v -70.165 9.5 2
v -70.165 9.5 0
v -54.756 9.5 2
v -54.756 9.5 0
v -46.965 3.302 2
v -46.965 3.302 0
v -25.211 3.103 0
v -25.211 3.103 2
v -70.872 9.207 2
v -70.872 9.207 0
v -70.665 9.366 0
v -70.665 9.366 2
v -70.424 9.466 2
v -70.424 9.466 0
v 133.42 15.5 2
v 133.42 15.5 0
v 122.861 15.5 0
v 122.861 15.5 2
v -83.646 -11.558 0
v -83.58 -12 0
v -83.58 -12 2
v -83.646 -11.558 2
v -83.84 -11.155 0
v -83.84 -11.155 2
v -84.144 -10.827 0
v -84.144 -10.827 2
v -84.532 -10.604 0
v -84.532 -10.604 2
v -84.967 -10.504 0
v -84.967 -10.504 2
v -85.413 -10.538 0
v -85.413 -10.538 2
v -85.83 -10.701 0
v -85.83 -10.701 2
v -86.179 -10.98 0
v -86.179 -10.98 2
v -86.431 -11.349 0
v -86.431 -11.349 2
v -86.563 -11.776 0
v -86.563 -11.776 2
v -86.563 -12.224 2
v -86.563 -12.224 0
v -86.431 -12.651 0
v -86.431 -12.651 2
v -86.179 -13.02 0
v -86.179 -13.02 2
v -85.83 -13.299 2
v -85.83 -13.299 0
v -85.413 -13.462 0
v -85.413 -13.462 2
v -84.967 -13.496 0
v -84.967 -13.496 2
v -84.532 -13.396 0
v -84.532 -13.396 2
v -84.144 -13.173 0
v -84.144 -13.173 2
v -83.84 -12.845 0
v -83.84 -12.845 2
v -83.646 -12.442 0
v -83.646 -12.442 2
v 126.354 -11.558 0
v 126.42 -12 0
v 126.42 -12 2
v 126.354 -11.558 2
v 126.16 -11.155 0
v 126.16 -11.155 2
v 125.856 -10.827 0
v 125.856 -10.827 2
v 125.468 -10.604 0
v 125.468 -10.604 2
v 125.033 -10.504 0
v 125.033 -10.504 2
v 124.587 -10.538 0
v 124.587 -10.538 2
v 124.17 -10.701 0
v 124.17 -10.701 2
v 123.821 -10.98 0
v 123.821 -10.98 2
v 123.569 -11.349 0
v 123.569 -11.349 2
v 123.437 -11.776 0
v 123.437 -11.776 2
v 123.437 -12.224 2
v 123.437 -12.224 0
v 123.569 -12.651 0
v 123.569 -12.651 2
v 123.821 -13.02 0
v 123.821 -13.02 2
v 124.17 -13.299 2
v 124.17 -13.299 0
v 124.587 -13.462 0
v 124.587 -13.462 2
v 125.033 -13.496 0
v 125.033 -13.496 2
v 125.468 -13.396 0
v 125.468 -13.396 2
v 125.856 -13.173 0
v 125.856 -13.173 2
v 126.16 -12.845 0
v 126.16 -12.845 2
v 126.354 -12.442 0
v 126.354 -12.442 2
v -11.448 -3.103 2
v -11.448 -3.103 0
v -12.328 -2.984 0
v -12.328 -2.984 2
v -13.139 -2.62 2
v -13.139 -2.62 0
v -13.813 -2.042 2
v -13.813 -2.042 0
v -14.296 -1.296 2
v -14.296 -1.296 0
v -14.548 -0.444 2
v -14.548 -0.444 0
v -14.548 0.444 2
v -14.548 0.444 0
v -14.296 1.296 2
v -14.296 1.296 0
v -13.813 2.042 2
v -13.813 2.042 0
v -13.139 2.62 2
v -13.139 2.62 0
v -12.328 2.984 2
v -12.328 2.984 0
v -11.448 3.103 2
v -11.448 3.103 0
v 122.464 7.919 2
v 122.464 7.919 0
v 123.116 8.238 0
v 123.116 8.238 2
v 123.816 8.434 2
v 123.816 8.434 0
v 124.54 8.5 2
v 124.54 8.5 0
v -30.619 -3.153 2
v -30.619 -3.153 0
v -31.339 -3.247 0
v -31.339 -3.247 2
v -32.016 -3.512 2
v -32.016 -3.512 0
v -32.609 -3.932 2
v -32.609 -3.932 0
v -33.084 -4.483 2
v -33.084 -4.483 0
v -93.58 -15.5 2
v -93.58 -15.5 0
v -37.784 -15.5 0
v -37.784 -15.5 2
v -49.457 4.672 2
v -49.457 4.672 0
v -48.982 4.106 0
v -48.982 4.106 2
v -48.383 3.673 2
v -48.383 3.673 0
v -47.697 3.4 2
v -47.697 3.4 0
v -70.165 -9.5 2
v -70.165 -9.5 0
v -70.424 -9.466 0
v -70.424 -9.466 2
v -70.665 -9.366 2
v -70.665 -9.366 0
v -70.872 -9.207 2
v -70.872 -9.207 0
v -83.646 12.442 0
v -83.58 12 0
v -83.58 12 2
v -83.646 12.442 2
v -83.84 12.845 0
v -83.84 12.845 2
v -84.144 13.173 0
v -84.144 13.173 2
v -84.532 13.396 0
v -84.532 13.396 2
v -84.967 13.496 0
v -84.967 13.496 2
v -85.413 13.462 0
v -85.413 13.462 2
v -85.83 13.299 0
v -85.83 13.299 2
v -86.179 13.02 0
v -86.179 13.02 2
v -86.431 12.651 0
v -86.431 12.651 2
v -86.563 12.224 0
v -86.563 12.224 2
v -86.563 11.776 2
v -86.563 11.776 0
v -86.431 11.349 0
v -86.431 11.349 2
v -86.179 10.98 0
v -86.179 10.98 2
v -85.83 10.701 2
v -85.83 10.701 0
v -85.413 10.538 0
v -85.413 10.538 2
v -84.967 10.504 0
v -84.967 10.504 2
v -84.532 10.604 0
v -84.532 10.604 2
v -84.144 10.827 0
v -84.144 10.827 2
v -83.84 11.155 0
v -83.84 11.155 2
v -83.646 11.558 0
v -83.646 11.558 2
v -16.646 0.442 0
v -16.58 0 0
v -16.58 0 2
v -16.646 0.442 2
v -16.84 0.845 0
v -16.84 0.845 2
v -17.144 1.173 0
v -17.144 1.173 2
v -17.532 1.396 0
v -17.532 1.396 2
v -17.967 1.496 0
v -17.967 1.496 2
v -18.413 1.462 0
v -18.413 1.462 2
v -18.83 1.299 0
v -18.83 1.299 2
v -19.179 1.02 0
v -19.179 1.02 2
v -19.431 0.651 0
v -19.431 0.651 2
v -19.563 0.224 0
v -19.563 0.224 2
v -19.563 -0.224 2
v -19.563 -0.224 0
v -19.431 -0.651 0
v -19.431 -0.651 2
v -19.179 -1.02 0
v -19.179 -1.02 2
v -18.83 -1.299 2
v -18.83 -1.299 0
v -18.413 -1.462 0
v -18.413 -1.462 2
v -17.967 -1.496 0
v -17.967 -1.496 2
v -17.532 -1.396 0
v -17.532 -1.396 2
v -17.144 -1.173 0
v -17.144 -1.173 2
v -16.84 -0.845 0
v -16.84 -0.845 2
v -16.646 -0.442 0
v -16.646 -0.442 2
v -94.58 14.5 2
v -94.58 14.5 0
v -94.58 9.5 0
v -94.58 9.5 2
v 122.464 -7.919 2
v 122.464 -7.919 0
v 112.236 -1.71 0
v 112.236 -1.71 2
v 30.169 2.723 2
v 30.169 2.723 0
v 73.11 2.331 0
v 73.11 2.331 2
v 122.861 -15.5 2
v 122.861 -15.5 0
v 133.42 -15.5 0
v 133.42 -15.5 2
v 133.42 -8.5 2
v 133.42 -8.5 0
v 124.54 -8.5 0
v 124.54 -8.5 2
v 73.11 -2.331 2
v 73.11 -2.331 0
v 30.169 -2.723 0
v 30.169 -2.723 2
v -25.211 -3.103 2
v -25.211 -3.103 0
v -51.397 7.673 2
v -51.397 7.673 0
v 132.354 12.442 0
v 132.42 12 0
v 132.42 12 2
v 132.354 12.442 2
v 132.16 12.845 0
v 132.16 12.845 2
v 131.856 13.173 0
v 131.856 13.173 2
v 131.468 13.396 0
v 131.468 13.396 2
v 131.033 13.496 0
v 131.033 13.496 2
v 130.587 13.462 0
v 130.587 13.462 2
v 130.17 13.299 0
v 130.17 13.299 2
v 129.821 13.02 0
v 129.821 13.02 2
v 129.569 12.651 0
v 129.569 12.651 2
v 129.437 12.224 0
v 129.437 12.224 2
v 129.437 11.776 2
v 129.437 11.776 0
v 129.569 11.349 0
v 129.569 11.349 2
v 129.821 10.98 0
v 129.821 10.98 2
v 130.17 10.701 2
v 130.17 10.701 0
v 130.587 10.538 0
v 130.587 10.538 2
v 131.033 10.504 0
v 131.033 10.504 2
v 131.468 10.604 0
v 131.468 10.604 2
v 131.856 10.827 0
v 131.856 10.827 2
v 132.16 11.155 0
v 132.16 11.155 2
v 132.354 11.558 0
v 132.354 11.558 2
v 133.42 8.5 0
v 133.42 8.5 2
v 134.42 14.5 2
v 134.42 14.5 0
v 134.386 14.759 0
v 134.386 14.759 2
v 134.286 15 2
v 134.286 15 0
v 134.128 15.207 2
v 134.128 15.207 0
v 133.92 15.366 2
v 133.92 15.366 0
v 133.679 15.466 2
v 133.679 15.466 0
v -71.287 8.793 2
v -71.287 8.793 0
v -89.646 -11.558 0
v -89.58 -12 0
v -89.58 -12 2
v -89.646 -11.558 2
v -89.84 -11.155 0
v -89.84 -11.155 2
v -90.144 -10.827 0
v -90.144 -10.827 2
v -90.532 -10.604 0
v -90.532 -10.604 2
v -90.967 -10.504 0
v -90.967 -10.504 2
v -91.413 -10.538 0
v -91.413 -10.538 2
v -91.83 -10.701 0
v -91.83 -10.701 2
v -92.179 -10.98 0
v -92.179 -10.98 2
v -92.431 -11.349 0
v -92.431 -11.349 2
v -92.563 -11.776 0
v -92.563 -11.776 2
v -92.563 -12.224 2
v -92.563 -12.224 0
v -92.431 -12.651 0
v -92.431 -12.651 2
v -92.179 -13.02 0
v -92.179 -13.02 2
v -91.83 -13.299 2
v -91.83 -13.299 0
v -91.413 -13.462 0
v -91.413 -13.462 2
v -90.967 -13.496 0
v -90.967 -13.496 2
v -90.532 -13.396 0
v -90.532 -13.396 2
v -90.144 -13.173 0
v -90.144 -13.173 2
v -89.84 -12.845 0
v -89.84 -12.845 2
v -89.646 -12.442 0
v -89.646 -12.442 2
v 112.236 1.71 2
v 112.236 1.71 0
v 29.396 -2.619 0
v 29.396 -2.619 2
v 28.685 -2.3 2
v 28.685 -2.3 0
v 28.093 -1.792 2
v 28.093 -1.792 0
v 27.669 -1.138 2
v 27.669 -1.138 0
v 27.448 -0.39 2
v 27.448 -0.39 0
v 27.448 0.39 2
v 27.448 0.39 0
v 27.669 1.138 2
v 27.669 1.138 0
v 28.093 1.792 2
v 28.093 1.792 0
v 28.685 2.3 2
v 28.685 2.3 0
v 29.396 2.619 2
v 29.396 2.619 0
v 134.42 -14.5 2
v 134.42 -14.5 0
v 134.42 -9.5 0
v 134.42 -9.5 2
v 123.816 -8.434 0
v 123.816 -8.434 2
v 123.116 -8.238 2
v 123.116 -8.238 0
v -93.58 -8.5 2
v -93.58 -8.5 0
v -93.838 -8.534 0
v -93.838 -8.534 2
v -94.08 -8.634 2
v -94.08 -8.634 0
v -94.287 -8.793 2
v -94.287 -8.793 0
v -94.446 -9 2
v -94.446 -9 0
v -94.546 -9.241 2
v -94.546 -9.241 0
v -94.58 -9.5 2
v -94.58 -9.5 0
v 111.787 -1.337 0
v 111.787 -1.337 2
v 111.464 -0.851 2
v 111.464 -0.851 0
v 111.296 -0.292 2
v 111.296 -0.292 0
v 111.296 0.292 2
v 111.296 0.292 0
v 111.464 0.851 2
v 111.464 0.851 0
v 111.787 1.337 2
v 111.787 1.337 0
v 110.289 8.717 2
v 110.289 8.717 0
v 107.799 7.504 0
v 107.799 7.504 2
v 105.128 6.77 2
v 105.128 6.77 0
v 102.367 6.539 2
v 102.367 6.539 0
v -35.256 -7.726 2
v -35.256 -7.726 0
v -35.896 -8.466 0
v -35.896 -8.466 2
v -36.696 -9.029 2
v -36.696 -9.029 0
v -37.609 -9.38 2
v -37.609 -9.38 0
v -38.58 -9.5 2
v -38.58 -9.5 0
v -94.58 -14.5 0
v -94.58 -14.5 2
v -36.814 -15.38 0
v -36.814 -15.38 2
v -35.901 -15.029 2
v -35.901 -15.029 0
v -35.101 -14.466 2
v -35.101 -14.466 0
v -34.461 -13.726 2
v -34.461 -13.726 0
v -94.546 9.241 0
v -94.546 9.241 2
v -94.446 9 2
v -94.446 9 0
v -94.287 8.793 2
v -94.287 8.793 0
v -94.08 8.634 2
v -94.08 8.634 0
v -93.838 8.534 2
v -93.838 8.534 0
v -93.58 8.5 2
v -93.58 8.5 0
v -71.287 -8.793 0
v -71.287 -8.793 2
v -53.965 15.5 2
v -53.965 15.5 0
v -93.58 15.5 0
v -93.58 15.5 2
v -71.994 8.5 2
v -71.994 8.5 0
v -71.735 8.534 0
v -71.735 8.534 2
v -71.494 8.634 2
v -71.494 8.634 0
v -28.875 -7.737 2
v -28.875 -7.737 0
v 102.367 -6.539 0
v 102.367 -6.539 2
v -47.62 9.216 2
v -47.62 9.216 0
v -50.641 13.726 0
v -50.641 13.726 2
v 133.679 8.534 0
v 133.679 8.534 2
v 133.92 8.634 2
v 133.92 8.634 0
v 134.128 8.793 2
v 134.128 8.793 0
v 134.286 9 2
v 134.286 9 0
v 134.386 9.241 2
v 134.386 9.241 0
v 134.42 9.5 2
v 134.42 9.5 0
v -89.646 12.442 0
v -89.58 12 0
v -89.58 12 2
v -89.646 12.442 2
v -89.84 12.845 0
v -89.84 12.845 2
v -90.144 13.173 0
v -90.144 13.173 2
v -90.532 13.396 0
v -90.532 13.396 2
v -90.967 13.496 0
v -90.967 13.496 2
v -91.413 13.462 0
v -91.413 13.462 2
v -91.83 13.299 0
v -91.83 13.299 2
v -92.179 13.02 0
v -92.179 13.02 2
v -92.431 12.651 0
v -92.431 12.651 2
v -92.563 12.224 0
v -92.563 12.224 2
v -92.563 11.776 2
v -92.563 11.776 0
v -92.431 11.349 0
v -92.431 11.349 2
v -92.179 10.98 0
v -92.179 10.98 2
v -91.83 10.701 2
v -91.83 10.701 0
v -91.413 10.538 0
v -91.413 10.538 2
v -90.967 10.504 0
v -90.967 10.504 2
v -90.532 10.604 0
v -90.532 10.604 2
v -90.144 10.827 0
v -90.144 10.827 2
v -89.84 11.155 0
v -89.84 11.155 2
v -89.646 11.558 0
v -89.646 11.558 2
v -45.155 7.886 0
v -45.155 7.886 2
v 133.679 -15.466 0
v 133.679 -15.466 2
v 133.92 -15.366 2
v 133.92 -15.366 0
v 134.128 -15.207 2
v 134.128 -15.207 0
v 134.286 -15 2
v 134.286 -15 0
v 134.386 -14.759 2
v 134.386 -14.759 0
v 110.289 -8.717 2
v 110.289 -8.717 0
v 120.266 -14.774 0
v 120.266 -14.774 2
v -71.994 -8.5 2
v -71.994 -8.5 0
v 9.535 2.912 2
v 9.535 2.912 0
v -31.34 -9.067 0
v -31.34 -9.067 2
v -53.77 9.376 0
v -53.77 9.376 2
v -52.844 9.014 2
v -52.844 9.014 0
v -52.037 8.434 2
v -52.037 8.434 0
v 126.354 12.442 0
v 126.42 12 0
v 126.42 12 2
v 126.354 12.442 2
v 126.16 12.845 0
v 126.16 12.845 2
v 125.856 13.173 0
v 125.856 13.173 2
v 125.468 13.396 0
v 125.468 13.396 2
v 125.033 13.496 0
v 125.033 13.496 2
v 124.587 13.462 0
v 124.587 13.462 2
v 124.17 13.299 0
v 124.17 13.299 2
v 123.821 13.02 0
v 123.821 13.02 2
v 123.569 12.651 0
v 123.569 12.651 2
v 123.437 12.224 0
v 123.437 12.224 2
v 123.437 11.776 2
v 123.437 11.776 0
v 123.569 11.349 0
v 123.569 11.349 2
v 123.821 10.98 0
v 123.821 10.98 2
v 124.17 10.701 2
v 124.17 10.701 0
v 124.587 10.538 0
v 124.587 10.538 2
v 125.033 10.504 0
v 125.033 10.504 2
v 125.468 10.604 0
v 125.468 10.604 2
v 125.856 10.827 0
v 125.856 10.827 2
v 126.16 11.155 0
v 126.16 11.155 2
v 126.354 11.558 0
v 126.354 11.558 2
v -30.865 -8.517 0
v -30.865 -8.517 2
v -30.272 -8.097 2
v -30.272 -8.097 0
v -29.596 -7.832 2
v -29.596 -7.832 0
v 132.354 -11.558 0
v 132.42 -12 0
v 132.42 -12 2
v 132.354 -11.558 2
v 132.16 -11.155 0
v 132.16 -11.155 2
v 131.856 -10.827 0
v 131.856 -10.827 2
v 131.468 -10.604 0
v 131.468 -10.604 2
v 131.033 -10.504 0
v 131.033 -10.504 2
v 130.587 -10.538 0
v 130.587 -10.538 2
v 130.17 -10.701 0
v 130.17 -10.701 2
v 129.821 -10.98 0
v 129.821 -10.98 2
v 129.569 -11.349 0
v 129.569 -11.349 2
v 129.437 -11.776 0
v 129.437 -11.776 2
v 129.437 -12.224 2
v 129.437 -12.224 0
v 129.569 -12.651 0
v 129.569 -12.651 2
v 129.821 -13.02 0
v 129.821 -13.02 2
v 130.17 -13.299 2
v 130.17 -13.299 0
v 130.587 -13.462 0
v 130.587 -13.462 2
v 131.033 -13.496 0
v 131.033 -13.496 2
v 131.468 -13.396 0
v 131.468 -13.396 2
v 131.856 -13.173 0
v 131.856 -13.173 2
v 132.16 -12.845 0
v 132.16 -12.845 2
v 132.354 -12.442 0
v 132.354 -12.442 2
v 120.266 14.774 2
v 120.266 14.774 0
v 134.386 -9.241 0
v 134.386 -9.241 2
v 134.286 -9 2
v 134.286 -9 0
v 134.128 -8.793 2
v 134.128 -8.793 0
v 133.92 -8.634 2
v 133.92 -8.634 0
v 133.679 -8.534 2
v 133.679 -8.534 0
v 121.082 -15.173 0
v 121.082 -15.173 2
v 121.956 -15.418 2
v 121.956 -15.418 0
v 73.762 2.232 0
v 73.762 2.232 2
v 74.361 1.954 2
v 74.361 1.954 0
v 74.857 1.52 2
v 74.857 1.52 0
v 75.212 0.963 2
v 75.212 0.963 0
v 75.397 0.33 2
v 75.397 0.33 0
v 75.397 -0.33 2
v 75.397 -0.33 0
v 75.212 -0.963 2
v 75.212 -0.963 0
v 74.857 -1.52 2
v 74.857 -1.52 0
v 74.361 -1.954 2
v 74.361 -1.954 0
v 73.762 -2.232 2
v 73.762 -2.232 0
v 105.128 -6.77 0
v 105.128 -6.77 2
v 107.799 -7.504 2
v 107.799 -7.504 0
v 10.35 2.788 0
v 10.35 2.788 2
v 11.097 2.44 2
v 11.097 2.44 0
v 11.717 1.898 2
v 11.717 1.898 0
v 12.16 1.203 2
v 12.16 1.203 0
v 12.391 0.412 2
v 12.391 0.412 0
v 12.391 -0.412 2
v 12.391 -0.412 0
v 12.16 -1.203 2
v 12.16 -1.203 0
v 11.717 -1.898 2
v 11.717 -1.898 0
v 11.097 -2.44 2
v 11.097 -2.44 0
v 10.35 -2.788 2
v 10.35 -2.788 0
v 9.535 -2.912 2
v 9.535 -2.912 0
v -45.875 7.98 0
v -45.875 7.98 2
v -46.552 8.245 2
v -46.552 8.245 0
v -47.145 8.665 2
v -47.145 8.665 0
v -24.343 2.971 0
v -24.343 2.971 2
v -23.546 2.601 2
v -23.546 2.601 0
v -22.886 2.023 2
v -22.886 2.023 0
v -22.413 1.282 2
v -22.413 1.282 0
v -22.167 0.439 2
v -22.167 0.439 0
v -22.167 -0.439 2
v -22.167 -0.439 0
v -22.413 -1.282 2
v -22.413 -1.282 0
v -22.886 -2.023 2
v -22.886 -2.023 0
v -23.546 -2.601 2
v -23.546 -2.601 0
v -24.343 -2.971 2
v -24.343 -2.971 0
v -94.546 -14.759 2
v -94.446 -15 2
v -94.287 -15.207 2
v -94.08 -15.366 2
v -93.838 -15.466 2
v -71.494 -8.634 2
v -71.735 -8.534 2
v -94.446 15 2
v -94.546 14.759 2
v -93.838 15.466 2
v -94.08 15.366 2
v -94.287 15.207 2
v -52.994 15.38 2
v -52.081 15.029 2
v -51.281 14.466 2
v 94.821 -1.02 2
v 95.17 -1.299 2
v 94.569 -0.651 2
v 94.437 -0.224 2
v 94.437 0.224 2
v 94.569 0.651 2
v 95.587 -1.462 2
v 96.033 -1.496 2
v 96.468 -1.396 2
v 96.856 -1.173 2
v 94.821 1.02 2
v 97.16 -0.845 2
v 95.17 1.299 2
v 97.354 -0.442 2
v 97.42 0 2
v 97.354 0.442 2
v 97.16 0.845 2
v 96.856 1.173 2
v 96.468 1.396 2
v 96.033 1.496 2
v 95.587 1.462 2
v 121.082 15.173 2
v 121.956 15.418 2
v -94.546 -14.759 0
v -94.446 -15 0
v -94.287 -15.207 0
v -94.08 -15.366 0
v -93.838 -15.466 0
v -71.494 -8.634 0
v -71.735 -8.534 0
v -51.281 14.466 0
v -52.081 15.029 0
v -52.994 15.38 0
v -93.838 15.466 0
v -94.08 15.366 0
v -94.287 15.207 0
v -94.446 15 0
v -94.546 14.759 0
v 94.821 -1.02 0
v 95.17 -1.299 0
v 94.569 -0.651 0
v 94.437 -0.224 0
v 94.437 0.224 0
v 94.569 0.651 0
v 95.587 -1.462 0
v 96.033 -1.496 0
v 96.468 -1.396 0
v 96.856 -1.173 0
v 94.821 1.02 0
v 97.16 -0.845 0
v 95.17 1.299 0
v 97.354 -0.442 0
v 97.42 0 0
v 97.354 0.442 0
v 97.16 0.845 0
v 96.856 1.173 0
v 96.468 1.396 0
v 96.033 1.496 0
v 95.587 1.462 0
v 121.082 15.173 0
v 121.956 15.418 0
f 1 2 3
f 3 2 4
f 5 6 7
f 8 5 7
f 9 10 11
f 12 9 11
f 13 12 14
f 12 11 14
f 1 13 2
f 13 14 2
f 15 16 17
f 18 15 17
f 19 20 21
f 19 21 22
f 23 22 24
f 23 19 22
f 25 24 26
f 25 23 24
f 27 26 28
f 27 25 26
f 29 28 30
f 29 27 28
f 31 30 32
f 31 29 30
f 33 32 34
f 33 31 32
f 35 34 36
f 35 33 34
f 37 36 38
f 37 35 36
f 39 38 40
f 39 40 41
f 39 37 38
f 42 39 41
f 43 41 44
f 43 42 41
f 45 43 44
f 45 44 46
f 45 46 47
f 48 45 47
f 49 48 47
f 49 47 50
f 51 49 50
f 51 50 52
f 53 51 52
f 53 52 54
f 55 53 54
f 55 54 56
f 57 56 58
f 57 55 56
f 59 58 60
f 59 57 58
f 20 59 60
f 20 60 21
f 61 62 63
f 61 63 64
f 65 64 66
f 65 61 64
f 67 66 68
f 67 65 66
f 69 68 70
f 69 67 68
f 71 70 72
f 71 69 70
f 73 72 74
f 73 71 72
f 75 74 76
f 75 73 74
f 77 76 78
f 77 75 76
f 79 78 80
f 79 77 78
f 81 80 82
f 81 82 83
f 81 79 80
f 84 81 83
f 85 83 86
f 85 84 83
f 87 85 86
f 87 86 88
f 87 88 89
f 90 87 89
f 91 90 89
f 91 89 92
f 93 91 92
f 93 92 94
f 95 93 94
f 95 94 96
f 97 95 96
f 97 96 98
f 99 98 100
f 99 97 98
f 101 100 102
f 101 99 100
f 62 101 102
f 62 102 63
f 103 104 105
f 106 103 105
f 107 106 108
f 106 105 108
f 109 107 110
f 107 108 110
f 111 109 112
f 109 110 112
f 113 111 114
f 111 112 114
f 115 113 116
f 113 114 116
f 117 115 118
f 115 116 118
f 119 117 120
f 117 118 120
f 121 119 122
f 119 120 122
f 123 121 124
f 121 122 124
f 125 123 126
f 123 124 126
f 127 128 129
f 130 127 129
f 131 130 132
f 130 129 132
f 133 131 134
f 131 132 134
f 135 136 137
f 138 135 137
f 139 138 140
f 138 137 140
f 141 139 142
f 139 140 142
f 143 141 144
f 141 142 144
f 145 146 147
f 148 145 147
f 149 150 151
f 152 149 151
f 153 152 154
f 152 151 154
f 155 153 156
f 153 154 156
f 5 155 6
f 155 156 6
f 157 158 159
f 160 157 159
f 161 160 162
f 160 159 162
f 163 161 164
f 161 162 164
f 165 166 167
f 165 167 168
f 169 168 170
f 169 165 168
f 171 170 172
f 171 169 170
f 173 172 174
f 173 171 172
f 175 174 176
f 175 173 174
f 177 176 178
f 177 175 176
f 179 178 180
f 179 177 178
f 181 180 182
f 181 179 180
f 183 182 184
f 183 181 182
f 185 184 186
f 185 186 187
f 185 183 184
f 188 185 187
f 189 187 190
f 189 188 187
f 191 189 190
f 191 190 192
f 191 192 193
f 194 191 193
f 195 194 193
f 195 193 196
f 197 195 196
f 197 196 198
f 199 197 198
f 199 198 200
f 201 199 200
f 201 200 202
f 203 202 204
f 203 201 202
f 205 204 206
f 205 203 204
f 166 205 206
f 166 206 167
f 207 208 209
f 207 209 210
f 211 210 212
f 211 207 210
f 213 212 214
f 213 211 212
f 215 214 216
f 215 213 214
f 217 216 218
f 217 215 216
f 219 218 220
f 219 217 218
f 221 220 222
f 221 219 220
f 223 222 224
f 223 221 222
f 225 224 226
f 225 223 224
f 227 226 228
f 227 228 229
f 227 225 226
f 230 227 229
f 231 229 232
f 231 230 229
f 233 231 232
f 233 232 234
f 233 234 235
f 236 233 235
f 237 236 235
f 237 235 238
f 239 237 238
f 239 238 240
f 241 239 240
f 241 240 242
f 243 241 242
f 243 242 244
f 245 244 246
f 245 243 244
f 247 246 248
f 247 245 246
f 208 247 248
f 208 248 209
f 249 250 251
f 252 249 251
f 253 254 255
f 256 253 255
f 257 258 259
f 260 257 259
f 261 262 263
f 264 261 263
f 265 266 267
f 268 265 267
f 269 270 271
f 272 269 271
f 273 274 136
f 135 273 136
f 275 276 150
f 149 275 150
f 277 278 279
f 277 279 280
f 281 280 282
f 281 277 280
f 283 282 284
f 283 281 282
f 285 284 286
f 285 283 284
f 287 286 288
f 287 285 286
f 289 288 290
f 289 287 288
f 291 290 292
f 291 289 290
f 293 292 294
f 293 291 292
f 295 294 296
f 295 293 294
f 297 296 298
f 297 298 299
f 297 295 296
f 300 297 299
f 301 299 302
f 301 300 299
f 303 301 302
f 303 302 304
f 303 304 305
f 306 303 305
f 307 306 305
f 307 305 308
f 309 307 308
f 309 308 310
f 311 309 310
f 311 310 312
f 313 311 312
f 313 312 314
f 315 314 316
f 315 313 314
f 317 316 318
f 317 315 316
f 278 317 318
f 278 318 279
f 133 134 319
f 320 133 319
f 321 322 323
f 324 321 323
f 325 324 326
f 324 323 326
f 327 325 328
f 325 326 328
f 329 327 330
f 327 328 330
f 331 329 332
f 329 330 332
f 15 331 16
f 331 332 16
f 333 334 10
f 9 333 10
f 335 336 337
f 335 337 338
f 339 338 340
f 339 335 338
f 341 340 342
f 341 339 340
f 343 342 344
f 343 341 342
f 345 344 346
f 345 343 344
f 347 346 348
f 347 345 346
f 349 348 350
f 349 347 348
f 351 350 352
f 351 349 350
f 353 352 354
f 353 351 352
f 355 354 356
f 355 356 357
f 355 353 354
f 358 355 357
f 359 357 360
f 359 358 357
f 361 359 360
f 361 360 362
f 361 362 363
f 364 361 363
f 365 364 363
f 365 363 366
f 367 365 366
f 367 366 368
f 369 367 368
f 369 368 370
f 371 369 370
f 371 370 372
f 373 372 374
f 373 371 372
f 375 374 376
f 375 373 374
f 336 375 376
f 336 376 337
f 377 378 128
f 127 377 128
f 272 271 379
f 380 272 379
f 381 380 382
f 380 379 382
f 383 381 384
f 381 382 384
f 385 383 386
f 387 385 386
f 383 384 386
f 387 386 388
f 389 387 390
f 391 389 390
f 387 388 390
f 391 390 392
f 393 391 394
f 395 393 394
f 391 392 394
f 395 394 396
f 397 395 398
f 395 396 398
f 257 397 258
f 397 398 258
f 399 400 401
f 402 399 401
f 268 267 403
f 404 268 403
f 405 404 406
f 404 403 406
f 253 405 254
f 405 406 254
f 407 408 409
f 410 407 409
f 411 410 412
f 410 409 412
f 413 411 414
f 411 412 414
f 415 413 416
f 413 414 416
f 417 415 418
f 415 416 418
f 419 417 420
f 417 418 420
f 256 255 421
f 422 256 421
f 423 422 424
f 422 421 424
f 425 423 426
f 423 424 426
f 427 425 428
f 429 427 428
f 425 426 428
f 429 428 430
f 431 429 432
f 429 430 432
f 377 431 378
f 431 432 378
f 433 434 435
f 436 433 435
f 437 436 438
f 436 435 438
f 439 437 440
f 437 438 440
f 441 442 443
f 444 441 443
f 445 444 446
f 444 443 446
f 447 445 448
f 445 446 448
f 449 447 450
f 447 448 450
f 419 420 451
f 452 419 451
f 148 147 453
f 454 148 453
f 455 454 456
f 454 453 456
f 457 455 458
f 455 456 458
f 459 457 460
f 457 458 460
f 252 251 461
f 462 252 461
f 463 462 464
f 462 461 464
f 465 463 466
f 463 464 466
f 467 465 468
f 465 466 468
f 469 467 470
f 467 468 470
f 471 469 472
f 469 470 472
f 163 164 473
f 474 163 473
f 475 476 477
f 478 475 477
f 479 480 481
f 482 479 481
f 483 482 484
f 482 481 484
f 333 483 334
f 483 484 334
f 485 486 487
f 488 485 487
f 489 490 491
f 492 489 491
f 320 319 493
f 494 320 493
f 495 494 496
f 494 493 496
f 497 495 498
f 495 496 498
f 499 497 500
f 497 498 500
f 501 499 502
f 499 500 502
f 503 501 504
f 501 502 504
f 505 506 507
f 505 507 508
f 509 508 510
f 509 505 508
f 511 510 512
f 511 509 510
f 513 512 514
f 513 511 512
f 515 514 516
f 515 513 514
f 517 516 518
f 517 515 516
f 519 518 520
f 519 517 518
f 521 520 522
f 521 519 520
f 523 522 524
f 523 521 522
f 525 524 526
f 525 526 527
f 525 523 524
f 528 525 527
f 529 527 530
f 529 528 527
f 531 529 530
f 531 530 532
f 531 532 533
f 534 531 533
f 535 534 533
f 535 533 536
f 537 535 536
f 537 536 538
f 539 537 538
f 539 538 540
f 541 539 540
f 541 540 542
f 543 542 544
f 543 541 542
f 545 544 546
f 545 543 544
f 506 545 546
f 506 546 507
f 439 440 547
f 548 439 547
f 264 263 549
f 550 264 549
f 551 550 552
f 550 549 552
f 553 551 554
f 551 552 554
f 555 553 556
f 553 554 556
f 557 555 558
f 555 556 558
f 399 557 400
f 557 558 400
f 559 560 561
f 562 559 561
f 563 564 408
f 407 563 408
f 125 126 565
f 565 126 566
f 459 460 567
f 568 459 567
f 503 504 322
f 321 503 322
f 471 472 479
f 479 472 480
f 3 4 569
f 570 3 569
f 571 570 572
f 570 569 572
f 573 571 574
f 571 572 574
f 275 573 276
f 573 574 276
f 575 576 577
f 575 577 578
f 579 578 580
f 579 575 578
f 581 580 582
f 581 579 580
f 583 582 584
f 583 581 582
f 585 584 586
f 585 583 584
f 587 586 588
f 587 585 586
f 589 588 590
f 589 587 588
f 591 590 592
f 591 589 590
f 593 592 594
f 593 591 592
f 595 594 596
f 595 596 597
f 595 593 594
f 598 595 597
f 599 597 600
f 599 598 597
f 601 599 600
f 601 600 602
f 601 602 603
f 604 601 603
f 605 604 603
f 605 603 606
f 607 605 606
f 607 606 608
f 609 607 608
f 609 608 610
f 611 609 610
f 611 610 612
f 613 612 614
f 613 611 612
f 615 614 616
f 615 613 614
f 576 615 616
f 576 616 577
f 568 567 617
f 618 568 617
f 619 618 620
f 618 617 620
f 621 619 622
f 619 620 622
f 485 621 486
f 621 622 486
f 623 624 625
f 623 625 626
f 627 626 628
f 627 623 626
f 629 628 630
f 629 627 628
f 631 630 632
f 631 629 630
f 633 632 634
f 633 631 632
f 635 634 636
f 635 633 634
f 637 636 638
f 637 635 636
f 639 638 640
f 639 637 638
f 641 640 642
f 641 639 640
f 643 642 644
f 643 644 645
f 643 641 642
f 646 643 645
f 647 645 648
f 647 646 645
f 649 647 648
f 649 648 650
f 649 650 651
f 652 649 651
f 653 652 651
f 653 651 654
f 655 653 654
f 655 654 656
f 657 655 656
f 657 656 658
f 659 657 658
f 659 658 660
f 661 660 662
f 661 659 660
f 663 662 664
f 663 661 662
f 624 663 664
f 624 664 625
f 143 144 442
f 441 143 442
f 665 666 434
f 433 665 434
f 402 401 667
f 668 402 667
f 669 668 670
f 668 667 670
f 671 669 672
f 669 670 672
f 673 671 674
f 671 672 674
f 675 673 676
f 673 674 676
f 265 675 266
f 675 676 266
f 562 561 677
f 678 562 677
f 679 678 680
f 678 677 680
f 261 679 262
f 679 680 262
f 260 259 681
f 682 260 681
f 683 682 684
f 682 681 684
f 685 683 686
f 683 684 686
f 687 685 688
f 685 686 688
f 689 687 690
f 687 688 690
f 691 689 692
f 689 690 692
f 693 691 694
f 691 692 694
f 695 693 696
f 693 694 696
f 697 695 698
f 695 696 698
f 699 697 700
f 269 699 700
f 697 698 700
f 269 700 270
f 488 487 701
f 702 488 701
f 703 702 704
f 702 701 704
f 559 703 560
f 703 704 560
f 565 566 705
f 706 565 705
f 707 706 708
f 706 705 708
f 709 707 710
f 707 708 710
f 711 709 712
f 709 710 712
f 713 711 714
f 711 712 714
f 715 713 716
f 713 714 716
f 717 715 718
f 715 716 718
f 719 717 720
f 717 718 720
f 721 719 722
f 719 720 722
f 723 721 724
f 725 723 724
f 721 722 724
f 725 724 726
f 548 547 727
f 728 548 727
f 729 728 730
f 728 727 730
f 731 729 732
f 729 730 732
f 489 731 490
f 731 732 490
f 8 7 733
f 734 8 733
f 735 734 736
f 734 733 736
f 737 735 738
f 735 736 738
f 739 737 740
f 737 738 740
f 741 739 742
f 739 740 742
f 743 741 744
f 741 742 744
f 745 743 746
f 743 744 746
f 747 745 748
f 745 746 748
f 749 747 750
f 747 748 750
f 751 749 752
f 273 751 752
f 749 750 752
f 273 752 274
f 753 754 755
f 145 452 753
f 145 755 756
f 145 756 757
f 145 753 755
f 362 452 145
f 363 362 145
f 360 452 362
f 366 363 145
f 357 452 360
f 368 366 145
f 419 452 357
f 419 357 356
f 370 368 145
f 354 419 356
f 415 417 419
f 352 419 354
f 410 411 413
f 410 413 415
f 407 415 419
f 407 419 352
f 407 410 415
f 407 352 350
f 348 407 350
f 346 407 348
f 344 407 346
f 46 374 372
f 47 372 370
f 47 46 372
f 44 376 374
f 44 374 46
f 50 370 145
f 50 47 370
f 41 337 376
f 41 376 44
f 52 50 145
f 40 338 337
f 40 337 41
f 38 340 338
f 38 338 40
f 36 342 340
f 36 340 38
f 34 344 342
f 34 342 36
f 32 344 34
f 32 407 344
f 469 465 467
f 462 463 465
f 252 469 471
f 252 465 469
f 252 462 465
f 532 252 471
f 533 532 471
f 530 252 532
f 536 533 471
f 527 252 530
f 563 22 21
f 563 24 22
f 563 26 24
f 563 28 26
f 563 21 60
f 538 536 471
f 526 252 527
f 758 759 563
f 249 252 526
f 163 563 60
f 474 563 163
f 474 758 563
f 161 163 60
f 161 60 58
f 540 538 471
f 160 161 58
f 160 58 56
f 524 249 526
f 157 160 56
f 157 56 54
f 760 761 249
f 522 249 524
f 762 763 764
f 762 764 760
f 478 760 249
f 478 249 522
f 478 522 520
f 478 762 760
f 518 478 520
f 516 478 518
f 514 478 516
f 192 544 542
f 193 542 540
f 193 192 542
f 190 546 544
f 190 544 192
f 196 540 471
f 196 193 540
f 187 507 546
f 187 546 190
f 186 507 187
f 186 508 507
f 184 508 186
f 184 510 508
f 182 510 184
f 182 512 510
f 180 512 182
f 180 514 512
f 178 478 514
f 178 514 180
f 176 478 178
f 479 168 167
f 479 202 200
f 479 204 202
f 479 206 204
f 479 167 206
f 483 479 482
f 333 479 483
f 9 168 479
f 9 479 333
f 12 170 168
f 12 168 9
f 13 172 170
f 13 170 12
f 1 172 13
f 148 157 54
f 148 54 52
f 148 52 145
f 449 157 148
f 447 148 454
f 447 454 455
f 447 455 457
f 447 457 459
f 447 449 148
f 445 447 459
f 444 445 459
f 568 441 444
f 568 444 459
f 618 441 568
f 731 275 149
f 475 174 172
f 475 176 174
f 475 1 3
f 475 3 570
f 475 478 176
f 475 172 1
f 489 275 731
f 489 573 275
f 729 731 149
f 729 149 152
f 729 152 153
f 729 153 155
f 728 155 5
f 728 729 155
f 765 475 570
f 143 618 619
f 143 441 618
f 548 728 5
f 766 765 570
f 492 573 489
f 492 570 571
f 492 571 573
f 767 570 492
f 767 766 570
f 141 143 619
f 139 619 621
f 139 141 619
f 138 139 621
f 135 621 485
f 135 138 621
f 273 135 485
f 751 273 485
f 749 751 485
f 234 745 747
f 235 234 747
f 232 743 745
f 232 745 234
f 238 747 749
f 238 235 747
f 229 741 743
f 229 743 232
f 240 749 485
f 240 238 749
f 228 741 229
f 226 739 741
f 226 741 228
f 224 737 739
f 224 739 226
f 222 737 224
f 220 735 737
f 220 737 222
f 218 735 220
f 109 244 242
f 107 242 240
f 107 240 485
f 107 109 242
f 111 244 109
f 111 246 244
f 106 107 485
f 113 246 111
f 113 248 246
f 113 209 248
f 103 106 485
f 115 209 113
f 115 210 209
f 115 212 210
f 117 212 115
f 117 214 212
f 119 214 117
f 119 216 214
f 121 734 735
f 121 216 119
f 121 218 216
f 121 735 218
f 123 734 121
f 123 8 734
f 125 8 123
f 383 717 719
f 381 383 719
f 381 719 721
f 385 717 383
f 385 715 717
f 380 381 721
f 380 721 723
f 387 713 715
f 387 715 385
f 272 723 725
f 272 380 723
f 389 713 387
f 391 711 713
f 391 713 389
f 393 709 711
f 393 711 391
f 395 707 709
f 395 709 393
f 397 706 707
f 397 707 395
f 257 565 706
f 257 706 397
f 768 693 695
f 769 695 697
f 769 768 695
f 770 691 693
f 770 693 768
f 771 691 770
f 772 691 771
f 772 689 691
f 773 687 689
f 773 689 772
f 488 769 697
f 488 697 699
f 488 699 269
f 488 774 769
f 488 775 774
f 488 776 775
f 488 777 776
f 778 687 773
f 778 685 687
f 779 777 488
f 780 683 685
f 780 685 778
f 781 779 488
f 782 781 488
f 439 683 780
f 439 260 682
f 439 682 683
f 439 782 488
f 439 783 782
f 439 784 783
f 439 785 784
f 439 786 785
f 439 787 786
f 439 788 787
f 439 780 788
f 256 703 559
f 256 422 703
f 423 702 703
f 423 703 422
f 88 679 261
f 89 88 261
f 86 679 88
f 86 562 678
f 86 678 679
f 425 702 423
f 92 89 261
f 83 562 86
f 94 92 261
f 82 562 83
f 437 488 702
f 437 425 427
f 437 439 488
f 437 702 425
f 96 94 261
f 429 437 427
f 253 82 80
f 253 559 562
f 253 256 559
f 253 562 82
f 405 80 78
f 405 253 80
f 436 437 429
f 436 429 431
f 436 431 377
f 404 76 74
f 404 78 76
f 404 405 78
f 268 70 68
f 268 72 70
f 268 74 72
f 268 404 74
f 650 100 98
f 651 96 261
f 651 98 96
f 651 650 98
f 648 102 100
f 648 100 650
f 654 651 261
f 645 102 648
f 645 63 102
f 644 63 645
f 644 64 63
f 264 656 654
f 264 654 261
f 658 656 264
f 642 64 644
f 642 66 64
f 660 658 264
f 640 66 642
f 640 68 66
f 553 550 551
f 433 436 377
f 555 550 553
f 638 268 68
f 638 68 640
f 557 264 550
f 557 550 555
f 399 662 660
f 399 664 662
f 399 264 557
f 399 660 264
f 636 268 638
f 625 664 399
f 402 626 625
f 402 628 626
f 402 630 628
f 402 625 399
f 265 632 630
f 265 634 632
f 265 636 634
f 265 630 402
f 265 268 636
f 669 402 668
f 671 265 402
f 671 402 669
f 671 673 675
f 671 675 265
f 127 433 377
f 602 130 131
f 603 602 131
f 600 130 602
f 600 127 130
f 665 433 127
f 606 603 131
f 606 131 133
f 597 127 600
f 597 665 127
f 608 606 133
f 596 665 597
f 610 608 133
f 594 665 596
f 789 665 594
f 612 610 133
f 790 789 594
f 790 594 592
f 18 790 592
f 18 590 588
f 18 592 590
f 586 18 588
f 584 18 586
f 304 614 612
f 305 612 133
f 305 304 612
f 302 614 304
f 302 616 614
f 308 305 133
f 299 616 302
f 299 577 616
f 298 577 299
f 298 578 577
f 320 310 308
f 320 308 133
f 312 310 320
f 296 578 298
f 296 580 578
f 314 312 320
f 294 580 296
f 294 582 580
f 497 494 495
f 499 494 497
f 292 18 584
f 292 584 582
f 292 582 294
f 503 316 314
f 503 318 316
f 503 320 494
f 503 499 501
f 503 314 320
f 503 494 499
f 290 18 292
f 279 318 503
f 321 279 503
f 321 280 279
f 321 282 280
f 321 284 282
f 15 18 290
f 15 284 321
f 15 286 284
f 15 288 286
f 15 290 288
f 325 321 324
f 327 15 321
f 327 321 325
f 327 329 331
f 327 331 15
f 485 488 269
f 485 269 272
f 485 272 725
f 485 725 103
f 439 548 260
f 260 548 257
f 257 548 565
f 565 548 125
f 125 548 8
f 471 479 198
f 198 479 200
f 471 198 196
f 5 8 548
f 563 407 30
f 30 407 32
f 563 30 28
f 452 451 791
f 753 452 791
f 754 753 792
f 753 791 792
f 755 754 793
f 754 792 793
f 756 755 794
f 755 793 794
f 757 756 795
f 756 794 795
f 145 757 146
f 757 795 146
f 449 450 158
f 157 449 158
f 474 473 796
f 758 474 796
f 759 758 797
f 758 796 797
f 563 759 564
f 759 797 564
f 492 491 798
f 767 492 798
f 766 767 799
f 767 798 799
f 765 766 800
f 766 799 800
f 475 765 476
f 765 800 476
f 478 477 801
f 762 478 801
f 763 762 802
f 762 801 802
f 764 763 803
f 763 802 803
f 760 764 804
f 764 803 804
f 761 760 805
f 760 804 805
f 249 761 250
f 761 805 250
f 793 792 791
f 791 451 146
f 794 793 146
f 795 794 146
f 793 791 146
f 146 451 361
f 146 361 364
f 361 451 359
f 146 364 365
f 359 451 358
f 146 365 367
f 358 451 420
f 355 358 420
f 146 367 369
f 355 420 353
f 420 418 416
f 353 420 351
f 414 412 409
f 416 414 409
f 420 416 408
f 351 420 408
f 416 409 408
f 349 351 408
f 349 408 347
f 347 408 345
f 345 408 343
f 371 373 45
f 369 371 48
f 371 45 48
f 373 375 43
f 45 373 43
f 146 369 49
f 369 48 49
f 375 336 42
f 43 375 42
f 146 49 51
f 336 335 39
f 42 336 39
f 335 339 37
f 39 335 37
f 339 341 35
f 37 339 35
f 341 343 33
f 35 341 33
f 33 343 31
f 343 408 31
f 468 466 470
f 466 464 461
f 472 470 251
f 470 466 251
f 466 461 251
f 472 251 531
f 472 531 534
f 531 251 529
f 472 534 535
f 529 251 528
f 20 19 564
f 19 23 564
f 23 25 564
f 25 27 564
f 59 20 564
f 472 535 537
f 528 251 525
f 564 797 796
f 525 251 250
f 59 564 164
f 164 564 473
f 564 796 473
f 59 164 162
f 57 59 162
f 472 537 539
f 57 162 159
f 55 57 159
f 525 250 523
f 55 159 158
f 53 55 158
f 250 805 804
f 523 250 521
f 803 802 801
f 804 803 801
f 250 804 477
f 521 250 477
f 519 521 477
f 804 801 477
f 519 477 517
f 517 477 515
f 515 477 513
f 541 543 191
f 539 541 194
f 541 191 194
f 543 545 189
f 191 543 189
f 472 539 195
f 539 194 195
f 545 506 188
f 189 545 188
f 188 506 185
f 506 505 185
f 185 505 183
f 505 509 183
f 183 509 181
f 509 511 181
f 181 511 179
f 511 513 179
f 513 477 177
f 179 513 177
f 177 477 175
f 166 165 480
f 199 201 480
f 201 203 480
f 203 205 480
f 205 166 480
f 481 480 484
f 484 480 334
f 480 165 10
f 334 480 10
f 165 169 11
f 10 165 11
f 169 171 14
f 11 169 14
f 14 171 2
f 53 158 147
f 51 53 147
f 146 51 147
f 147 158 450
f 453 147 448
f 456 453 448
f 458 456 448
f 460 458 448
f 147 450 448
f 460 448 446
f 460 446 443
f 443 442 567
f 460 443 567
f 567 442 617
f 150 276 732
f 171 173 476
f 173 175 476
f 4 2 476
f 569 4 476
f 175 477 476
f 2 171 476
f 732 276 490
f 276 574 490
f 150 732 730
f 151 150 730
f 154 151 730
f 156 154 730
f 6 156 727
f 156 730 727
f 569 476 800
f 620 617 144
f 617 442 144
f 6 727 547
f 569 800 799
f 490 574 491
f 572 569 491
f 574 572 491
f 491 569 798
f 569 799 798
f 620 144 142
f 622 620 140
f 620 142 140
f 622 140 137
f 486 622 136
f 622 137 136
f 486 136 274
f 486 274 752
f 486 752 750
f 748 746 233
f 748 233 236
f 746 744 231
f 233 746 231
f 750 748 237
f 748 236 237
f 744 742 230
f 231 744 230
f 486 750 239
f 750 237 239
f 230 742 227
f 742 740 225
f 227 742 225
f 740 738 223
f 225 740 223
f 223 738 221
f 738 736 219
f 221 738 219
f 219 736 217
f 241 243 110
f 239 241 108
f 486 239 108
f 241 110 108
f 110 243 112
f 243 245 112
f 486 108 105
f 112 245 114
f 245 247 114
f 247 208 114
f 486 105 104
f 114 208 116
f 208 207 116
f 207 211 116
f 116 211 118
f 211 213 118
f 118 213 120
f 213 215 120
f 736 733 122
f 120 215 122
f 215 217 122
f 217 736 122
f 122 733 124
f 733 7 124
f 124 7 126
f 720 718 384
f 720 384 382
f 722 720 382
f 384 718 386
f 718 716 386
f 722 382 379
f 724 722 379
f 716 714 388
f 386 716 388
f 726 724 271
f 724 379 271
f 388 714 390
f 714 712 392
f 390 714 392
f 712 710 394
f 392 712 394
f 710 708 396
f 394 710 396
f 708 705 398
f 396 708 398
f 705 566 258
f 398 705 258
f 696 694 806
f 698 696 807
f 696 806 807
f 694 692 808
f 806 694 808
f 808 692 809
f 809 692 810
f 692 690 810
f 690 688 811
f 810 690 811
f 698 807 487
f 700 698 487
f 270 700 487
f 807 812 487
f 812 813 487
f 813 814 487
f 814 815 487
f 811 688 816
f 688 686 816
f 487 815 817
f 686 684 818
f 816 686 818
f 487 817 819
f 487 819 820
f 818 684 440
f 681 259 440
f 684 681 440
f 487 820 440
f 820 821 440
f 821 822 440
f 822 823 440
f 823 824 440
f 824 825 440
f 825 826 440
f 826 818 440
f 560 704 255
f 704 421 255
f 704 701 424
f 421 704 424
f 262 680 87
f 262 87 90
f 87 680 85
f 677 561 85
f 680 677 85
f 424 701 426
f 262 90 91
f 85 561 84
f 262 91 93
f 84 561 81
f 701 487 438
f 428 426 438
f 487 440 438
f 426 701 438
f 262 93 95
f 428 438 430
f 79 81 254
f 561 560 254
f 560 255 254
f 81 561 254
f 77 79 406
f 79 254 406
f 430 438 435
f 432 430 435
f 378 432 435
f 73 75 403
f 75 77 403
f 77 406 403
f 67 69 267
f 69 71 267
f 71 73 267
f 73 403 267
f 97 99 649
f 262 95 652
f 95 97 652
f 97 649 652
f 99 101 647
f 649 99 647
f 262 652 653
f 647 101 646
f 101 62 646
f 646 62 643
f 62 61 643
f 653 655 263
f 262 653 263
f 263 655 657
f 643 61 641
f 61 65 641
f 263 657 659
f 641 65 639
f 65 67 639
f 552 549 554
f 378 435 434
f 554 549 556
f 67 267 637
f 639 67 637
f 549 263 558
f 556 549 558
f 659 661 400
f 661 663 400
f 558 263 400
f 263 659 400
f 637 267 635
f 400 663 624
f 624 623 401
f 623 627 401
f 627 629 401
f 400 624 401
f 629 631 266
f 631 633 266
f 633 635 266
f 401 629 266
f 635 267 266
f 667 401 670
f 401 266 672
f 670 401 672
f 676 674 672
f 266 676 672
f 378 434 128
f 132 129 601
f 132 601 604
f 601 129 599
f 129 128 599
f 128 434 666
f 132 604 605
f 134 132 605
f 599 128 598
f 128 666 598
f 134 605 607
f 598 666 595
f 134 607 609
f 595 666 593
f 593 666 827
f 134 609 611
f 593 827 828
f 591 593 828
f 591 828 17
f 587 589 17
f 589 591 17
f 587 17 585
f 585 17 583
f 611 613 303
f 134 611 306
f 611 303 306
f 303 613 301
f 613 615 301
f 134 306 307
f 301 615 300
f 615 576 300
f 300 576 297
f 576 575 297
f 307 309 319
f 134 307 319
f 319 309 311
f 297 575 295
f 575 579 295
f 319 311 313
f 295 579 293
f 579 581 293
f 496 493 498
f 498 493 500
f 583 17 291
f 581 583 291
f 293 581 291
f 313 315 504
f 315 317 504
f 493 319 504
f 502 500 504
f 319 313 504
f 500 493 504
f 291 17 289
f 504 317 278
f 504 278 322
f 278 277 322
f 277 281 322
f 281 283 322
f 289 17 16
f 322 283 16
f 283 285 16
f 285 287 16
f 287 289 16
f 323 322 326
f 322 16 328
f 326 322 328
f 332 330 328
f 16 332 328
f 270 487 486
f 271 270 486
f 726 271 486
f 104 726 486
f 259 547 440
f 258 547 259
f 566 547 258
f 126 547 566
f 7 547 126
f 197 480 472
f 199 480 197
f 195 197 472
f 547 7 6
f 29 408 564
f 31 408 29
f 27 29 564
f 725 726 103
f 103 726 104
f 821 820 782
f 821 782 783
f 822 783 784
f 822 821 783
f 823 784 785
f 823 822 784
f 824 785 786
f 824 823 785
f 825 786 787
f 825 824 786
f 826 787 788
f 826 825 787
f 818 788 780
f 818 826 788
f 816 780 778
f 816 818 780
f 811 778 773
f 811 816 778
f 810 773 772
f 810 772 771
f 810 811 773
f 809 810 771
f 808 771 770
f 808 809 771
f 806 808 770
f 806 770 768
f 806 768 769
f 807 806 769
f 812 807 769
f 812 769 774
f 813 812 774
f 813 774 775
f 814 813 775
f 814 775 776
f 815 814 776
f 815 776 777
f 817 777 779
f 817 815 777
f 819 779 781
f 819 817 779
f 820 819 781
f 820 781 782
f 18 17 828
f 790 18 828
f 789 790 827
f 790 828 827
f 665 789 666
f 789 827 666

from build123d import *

# Parameters (mm, degrees)
F0_R     = 1.5
F1_DEPTH = 2


with BuildPart() as f1:
    # F0 (on Top) → F1 (new body)
    with BuildSketch(Plane.XY):
        with BuildLine():
            Line((-94.579593, -9.5), (-94.579593, -14.5))
            ThreePointArc((-94.579593, -14.5), (-94.2867, -15.207107), (-93.579593, -15.5))
            Line((-93.579593, -15.5), (-37.784385, -15.5))
            ThreePointArc((-37.784385, -15.5), (-35.90089, -15.028802), (-34.461144, -13.726222))
            Line((-34.461144, -13.726222), (-31.340059, -9.067154))
            ThreePointArc((-31.340059, -9.067154), (-30.272313, -8.096694), (-28.87501, -7.736946))
            Line((-28.87501, -7.736946), (102.367442, -6.538983))
            ThreePointArc((102.367442, -6.538983), (106.480219, -7.07487), (110.289026, -8.716546))
            Line((110.289026, -8.716546), (120.265907, -14.773938))
            ThreePointArc((120.265907, -14.773938), (121.51352, -15.315064), (122.860798, -15.5))
            Line((122.860798, -15.5), (133.420407, -15.5))
            ThreePointArc((133.420407, -15.5), (134.127514, -15.207107), (134.420407, -14.5))
            Line((134.420407, -14.5), (134.420407, -9.5))
            ThreePointArc((134.420407, -9.5), (134.127514, -8.792893), (133.420407, -8.5))
            Line((133.420407, -8.5), (124.539625, -8.5))
            ThreePointArc((124.539625, -8.5), (123.461804, -8.352051), (122.463713, -7.91915))
            Line((122.463713, -7.91915), (112.236177, -1.709575))
            ThreePointArc((112.236177, -1.709575), (111.274134, 0), (112.236177, 1.709575))
            Line((112.236177, 1.709575), (122.463713, 7.91915))
            ThreePointArc((122.463713, 7.91915), (123.461804, 8.352051), (124.539625, 8.5))
            Line((124.539625, 8.5), (133.420407, 8.5))
            ThreePointArc((133.420407, 8.5), (134.127514, 8.792893), (134.420407, 9.5))
            Line((134.420407, 9.5), (134.420407, 14.5))
            ThreePointArc((134.420407, 14.5), (134.127514, 15.207107), (133.420407, 15.5))
            Line((133.420407, 15.5), (122.860798, 15.5))
            ThreePointArc((122.860798, 15.5), (121.51352, 15.315064), (120.265907, 14.773938))
            Line((120.265907, 14.773938), (110.289026, 8.716546))
            ThreePointArc((110.289026, 8.716546), (106.480219, 7.07487), (102.367442, 6.538983))
            Line((102.367442, 6.538983), (-45.154761, 7.885545))
            ThreePointArc((-45.154761, 7.885545), (-46.552064, 8.245293), (-47.619809, 9.215753))
            Line((-47.619809, 9.215753), (-50.641349, 13.726222))
            ThreePointArc((-50.641349, 13.726222), (-52.081095, 15.028802), (-53.96459, 15.5))
            Line((-53.96459, 15.5), (-93.579593, 15.5))
            ThreePointArc((-93.579593, 15.5), (-94.2867, 15.207107), (-94.579593, 14.5))
            Line((-94.579593, 14.5), (-94.579593, 9.5))
            ThreePointArc((-94.579593, 9.5), (-94.2867, 8.792893), (-93.579593, 8.5))
            Line((-93.579593, 8.5), (-71.993807, 8.5))
            ThreePointArc((-71.993807, 8.5), (-71.611123, 8.57612), (-71.2867, 8.792893))
            Line((-71.2867, 8.792893), (-70.872486, 9.207107))
            ThreePointArc((-70.872486, 9.207107), (-70.548063, 9.42388), (-70.16538, 9.5))
            Line((-70.16538, 9.5), (-54.756, 9.5))
            ThreePointArc((-54.756, 9.5), (-52.844256, 9.013578), (-51.397468, 7.672617))
            Line((-51.397468, 7.672617), (-49.456572, 4.67229))
            ThreePointArc((-49.456572, 4.67229), (-48.383493, 3.67314), (-46.965056, 3.301877))
            Line((-46.965056, 3.301877), (-25.211099, 3.10331))
            ThreePointArc((-25.211099, 3.10331), (-22.135986, 0), (-25.211099, -3.10331))
            Line((-25.211099, -3.10331), (-30.618603, -3.152669))
            ThreePointArc((-30.618603, -3.152669), (-32.015906, -3.512417), (-33.083652, -4.482878))
            Line((-33.083652, -4.482878), (-35.256352, -7.726222))
            ThreePointArc((-35.256352, -7.726222), (-36.696098, -9.028802), (-38.579593, -9.5))
            Line((-38.579593, -9.5), (-70.16538, -9.5))
            ThreePointArc((-70.16538, -9.5), (-70.548063, -9.42388), (-70.872486, -9.207107))
            Line((-70.872486, -9.207107), (-71.2867, -8.792893))
            ThreePointArc((-71.2867, -8.792893), (-71.611123, -8.57612), (-71.993807, -8.5))
            Line((-71.993807, -8.5), (-93.579593, -8.5))
            ThreePointArc((-93.579593, -8.5), (-94.2867, -8.792893), (-94.579593, -9.5))
        make_face()
        with Locations((-91.079593, -12)):
            Circle(F0_R, mode=Mode.SUBTRACT)
        with Locations((-85.079593, -12)):
            Circle(F0_R, mode=Mode.SUBTRACT)
        with Locations((124.920407, -12)):
            Circle(F0_R, mode=Mode.SUBTRACT)
        with Locations((130.920407, -12)):
            Circle(F0_R, mode=Mode.SUBTRACT)
        with Locations((-18.079593, 0)):
            Circle(F0_R, mode=Mode.SUBTRACT)
        with BuildLine():
            Line((9.535083, -2.911781), (-11.447827, -3.10331))
            ThreePointArc((-11.447827, -3.10331), (-14.579593, 0), (-11.447827, 3.10331))
            Line((-11.447827, 3.10331), (9.535083, 2.911781))
            ThreePointArc((9.535083, 2.911781), (12.420407, 0), (9.535083, -2.911781))
        make_face(mode=Mode.SUBTRACT)
        with Locations((-91.079593, 12)):
            Circle(F0_R, mode=Mode.SUBTRACT)
        with Locations((-85.079593, 12)):
            Circle(F0_R, mode=Mode.SUBTRACT)
        with BuildLine():
            ThreePointArc((73.110114, 2.331478), (75.420407, 0), (73.110114, -2.331478))
            Line((73.110114, -2.331478), (30.168819, -2.72344))
            ThreePointArc((30.168819, -2.72344), (27.420407, 0), (30.168819, 2.72344))
            Line((30.168819, 2.72344), (73.110114, 2.331478))
        make_face(mode=Mode.SUBTRACT)
        with Locations((95.920407, 0)):
            Circle(F0_R, mode=Mode.SUBTRACT)
        with Locations((124.920407, 12)):
            Circle(F0_R, mode=Mode.SUBTRACT)
        with Locations((130.920407, 12)):
            Circle(F0_R, mode=Mode.SUBTRACT)
    extrude(amount=F1_DEPTH)


solid = f1.part
